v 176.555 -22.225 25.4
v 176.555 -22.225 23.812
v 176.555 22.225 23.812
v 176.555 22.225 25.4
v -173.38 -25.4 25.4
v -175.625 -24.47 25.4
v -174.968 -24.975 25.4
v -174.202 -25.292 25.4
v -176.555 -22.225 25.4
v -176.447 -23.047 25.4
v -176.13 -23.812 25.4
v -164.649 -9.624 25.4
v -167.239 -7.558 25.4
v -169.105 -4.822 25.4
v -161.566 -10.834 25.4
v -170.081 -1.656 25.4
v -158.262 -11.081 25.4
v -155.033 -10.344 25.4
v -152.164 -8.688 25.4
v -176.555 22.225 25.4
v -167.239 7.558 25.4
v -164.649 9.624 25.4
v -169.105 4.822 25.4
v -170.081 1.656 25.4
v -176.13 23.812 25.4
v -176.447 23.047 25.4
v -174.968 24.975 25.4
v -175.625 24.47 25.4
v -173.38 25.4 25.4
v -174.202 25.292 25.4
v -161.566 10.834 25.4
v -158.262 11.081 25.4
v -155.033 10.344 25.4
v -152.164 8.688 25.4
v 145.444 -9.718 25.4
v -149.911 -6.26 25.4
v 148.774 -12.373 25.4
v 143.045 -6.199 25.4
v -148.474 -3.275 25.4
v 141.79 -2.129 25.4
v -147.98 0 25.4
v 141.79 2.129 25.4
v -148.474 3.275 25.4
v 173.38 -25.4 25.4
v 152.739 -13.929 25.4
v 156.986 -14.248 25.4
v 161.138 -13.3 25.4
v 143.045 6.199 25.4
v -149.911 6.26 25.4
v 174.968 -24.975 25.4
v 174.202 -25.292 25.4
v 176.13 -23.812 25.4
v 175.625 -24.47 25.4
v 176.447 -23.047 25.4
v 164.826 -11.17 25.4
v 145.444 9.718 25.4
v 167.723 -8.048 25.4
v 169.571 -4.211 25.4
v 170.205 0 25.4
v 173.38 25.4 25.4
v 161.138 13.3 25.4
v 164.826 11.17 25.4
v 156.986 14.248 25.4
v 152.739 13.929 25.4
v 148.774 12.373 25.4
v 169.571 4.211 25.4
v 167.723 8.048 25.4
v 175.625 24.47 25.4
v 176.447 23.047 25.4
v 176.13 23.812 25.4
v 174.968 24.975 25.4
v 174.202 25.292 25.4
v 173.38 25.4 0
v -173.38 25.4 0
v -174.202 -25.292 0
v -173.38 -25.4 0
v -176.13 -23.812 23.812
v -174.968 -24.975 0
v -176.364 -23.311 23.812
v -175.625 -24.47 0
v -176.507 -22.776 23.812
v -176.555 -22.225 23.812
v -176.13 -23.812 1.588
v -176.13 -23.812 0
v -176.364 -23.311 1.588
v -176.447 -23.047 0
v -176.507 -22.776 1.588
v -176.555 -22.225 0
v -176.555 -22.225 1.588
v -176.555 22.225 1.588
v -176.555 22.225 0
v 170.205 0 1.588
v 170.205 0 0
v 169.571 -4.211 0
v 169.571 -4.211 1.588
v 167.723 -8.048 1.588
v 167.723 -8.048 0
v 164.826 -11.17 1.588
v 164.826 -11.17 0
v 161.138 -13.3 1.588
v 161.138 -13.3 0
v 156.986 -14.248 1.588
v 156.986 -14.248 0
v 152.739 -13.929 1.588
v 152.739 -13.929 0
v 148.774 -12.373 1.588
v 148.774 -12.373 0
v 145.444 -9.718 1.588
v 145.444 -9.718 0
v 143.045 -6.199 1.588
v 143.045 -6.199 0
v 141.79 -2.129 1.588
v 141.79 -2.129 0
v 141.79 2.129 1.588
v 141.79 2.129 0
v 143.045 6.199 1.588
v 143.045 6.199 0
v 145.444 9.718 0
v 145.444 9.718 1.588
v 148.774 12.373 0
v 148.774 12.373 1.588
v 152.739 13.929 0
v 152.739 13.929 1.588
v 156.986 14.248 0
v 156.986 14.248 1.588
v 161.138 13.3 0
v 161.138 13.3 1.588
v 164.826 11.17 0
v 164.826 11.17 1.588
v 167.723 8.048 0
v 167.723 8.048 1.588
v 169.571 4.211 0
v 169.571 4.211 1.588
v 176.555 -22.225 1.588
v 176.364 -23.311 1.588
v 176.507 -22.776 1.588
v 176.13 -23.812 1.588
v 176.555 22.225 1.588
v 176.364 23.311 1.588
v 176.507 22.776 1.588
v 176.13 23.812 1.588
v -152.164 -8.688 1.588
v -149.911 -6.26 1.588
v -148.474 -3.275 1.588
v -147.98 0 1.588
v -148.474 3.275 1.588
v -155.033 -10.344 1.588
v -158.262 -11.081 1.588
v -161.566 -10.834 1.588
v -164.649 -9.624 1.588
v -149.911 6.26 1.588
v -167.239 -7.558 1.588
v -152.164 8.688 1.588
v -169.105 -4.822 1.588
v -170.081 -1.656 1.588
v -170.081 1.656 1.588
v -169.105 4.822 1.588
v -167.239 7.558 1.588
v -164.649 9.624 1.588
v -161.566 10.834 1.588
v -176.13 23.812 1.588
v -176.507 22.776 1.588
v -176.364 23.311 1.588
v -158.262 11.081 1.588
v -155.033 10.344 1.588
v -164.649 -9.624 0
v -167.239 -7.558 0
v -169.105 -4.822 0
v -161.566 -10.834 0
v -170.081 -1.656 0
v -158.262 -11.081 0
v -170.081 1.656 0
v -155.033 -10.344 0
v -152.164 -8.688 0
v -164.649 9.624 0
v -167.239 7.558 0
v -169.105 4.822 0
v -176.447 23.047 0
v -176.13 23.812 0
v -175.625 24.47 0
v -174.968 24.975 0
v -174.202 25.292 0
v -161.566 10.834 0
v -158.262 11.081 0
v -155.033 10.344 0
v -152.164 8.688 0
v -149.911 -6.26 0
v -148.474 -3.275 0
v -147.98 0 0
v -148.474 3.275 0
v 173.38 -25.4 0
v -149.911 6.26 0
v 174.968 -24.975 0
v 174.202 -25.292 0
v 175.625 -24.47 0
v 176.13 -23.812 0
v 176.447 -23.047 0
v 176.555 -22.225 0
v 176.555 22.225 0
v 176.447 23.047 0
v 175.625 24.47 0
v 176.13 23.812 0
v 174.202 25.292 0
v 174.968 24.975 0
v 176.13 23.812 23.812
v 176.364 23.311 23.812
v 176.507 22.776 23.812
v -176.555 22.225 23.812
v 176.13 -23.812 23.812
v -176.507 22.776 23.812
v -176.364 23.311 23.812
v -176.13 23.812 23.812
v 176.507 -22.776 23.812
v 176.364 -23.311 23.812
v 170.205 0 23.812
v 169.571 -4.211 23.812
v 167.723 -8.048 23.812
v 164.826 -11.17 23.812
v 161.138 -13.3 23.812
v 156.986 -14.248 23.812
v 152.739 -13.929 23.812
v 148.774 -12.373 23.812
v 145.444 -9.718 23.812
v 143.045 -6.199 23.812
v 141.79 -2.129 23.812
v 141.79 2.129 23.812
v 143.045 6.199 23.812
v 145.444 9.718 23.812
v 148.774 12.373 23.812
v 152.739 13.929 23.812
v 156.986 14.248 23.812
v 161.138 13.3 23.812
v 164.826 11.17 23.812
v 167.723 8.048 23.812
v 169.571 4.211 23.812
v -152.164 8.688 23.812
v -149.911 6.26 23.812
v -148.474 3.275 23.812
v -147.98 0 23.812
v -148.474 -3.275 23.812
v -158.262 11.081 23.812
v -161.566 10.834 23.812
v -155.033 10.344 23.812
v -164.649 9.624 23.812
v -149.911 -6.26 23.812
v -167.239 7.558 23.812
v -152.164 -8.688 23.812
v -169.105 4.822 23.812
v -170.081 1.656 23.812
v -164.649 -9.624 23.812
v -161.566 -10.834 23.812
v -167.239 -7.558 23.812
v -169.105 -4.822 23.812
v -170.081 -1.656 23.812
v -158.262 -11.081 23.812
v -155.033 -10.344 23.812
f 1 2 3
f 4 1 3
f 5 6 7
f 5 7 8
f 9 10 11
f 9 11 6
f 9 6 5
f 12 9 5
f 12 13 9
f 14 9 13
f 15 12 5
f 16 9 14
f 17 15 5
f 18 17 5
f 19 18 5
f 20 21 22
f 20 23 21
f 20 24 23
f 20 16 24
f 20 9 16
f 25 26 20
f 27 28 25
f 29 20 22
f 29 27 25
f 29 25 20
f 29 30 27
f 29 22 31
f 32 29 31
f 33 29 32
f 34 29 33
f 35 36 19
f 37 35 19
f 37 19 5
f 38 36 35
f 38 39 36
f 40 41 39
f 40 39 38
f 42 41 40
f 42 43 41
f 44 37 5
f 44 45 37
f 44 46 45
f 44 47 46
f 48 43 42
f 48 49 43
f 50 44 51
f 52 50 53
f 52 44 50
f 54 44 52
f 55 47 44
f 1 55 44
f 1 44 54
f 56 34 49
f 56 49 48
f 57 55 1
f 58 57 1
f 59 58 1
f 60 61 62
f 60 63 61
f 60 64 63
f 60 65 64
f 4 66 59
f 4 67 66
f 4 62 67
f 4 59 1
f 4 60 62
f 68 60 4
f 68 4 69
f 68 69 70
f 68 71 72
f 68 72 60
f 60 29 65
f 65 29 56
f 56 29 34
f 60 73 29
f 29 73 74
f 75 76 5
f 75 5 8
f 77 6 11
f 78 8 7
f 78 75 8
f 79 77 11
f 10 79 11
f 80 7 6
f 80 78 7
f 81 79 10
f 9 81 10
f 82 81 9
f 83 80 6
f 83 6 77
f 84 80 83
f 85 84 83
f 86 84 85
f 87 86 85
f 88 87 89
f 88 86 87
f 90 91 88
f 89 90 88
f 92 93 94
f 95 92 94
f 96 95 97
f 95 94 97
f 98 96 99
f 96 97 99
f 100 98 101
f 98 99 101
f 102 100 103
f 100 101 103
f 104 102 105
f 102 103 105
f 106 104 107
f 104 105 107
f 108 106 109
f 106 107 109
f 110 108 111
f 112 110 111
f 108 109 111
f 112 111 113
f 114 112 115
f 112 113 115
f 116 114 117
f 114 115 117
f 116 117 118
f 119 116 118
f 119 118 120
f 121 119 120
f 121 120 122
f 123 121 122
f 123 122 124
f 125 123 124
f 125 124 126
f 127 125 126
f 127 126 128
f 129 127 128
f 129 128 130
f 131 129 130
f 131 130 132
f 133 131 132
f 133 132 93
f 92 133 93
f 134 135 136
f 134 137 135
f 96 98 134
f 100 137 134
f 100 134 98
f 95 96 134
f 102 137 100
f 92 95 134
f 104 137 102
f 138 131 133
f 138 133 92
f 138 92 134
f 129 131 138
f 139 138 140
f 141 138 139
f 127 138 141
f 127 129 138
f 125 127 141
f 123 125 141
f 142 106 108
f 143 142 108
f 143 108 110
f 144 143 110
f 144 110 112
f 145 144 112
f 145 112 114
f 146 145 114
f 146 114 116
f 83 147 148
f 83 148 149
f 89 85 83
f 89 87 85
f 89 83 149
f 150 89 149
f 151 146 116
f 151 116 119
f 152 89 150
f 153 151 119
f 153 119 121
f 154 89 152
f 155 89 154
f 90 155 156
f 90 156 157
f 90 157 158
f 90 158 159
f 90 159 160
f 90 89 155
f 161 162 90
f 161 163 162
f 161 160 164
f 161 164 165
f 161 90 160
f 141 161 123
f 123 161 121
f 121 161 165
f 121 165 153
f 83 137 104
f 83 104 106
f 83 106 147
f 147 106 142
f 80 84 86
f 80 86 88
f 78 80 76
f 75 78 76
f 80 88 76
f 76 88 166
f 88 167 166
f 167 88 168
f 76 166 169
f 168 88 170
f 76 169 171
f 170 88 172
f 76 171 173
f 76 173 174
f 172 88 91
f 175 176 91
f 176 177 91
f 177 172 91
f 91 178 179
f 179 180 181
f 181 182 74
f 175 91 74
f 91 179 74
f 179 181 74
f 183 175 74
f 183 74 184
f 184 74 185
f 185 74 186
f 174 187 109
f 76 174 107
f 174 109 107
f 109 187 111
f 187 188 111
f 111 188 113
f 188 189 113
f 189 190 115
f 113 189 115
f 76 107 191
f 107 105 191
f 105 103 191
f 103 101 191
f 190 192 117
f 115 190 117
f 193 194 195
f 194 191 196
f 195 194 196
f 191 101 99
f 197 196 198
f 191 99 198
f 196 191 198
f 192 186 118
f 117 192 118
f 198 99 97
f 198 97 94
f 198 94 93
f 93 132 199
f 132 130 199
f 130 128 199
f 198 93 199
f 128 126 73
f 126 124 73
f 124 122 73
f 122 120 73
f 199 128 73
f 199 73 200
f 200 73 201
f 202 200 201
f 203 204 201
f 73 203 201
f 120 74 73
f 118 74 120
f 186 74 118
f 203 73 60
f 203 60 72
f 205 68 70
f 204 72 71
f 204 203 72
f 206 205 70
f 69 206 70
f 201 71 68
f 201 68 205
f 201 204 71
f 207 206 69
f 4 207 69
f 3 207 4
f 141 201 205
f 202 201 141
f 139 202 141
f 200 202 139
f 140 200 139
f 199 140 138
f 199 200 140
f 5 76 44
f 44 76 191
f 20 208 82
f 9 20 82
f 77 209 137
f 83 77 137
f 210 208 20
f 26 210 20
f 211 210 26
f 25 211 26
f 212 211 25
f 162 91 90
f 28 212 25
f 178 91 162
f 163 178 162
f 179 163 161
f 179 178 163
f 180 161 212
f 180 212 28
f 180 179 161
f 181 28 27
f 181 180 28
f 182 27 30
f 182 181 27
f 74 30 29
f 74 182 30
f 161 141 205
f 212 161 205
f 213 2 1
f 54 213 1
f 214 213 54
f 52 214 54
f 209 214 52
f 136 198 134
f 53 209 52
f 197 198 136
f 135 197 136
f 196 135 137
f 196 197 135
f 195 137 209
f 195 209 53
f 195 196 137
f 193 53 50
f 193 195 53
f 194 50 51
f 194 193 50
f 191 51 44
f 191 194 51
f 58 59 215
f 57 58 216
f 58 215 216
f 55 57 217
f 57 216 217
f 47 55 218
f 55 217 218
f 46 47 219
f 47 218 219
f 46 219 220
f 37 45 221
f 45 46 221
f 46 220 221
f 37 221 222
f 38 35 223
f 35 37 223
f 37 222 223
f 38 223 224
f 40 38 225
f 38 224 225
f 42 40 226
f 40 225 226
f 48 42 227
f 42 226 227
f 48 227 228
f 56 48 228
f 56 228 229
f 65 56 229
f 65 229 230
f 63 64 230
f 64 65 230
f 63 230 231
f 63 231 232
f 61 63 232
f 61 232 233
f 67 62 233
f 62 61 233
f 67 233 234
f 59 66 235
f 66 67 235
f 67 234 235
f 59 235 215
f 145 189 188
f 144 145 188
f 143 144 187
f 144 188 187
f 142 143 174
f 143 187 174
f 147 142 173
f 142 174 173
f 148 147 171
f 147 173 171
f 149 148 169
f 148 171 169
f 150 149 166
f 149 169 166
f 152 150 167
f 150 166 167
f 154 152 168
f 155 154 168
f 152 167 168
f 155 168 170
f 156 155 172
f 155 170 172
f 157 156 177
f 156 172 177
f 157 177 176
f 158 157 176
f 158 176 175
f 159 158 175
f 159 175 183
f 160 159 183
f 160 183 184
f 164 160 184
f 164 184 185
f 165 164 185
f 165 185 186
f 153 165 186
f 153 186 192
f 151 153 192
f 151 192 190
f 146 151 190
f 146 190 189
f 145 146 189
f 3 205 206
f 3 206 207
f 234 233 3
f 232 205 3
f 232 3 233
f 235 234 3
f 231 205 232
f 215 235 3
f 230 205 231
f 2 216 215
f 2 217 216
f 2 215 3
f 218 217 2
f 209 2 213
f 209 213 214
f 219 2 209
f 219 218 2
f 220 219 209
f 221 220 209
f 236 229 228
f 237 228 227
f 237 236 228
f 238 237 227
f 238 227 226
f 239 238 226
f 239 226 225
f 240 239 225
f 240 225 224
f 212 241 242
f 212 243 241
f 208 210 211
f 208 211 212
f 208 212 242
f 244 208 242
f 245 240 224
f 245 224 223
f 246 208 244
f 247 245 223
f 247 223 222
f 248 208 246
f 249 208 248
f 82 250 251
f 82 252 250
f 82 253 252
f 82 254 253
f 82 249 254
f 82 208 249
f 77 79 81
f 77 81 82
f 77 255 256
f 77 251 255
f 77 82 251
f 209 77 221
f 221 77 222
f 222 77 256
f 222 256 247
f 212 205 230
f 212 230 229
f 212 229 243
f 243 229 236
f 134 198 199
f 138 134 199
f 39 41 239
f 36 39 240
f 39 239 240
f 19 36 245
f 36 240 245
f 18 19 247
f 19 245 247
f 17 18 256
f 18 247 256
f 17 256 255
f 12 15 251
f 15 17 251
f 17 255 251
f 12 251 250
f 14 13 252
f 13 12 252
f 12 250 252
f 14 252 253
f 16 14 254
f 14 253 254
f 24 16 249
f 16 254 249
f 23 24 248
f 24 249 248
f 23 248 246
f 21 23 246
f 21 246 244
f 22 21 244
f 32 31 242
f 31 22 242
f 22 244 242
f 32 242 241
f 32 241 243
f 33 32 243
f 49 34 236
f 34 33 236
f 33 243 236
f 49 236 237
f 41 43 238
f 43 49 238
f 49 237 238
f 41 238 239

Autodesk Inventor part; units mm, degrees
ref_plane "YZ Plane" through (0, 0, 0) normal (1, 0, 0) x (0, 1, 0)
ref_plane "XZ Plane" through (0, 0, 0) normal (0, 1, 0) x (-1, 0, 0)
ref_plane "XY Plane" through (0, 0, 0) normal (0, 0, 1) x (1, 0, 0)
sketch "Sketch1" plane through (0, 0, 0) normal (0, 0, 1) x (1, 0, 0)
  line L0 (-173.3804, -25.4) -> (173.3804, -25.4)
  line L1 (176.5554, -22.225) -> (176.5554, 22.225)
  line L2 (173.3804, 25.4) -> (-173.3804, 25.4)
  line L3 (-176.5554, 22.225) -> (-176.5554, -22.225)
  circle A0 centre (-159.0929, 0) radius 11.1125
  circle A1 centre (155.9179, 0) radius 14.2875
  arc A2 (-176.5554, -22.225) -> (-173.3804, -25.4) centre (-173.3804, -22.225) ccw
  arc A3 (173.3804, -25.4) -> (176.5554, -22.225) centre (173.3804, -22.225) ccw
  arc A4 (176.5554, 22.225) -> (173.3804, 25.4) centre (173.3804, 22.225) ccw
  arc A5 (-173.3804, 25.4) -> (-176.5554, 22.225) centre (-173.3804, 22.225) ccw
  point P0 (0, 0)
  point P1 (-176.5554, -25.4)
  point P2 (176.5554, 25.4)
  point P3 (176.5554, -25.4)
  point P4 (-176.5554, 25.4)
  point P5 (-176.5554, 0)
  point P6 (0, 25.4)
  dimension "d5" = 315.0108
  dimension "d6" = 22.225
  dimension "d7" = 20.6375
  dimension "d8" = 17.4625
  dimension "d9" = 50.8
  dimension "d11" = 3.175
  dimension "d16" = 28.575
extrude "Extrusion1" add sketch "Sketch1" along normal blind 25.4
sketch "Sketch2" plane through (0, 0, 0) normal (1, 0, 0) x (0, 1, 0)
  line L0 (25.4, 25.4) -> (22.225, 25.4) projected
  line L1 (-22.225, 25.4) -> (22.225, 25.4) projected
  line L2 (-22.225, 25.4) -> (-25.4, 25.4) projected
  line L3 (-25.4, 0) -> (-25.4, 25.4) projected
  line L4 (-22.225, 0) -> (-25.4, 0) projected
  line L5 (-22.225, 0) -> (22.225, 0) projected
  line L6 (25.4, 0) -> (22.225, 0) projected
  line L7 (25.4, 0) -> (25.4, 25.4) projected
  line L8 (23.8125, 23.8125) -> (6.35, 23.8125)
  line L9 (6.35, 23.8125) -> (-6.35, 23.8125)
  line L10 (-6.35, 23.8125) -> (-23.8125, 23.8125)
  line L11 (-23.8125, 23.8125) -> (-23.8125, 1.5875)
  line L12 (-23.8125, 1.5875) -> (-6.35, 1.5875)
  line L13 (-6.35, 1.5875) -> (6.35, 1.5875)
  line L14 (6.35, 1.5875) -> (23.8125, 1.5875)
  line L15 (23.8125, 1.5875) -> (23.8125, 23.8125)
  dimension "d15" = 1.5875
extrude "Extrusion2" cut sketch "Sketch2" along normal through all both and the other way through all contours L15 L14 L13 L12 L11 L10 L9 L8
properties part number "SideBar13v2" material "Aluminum 6061"
